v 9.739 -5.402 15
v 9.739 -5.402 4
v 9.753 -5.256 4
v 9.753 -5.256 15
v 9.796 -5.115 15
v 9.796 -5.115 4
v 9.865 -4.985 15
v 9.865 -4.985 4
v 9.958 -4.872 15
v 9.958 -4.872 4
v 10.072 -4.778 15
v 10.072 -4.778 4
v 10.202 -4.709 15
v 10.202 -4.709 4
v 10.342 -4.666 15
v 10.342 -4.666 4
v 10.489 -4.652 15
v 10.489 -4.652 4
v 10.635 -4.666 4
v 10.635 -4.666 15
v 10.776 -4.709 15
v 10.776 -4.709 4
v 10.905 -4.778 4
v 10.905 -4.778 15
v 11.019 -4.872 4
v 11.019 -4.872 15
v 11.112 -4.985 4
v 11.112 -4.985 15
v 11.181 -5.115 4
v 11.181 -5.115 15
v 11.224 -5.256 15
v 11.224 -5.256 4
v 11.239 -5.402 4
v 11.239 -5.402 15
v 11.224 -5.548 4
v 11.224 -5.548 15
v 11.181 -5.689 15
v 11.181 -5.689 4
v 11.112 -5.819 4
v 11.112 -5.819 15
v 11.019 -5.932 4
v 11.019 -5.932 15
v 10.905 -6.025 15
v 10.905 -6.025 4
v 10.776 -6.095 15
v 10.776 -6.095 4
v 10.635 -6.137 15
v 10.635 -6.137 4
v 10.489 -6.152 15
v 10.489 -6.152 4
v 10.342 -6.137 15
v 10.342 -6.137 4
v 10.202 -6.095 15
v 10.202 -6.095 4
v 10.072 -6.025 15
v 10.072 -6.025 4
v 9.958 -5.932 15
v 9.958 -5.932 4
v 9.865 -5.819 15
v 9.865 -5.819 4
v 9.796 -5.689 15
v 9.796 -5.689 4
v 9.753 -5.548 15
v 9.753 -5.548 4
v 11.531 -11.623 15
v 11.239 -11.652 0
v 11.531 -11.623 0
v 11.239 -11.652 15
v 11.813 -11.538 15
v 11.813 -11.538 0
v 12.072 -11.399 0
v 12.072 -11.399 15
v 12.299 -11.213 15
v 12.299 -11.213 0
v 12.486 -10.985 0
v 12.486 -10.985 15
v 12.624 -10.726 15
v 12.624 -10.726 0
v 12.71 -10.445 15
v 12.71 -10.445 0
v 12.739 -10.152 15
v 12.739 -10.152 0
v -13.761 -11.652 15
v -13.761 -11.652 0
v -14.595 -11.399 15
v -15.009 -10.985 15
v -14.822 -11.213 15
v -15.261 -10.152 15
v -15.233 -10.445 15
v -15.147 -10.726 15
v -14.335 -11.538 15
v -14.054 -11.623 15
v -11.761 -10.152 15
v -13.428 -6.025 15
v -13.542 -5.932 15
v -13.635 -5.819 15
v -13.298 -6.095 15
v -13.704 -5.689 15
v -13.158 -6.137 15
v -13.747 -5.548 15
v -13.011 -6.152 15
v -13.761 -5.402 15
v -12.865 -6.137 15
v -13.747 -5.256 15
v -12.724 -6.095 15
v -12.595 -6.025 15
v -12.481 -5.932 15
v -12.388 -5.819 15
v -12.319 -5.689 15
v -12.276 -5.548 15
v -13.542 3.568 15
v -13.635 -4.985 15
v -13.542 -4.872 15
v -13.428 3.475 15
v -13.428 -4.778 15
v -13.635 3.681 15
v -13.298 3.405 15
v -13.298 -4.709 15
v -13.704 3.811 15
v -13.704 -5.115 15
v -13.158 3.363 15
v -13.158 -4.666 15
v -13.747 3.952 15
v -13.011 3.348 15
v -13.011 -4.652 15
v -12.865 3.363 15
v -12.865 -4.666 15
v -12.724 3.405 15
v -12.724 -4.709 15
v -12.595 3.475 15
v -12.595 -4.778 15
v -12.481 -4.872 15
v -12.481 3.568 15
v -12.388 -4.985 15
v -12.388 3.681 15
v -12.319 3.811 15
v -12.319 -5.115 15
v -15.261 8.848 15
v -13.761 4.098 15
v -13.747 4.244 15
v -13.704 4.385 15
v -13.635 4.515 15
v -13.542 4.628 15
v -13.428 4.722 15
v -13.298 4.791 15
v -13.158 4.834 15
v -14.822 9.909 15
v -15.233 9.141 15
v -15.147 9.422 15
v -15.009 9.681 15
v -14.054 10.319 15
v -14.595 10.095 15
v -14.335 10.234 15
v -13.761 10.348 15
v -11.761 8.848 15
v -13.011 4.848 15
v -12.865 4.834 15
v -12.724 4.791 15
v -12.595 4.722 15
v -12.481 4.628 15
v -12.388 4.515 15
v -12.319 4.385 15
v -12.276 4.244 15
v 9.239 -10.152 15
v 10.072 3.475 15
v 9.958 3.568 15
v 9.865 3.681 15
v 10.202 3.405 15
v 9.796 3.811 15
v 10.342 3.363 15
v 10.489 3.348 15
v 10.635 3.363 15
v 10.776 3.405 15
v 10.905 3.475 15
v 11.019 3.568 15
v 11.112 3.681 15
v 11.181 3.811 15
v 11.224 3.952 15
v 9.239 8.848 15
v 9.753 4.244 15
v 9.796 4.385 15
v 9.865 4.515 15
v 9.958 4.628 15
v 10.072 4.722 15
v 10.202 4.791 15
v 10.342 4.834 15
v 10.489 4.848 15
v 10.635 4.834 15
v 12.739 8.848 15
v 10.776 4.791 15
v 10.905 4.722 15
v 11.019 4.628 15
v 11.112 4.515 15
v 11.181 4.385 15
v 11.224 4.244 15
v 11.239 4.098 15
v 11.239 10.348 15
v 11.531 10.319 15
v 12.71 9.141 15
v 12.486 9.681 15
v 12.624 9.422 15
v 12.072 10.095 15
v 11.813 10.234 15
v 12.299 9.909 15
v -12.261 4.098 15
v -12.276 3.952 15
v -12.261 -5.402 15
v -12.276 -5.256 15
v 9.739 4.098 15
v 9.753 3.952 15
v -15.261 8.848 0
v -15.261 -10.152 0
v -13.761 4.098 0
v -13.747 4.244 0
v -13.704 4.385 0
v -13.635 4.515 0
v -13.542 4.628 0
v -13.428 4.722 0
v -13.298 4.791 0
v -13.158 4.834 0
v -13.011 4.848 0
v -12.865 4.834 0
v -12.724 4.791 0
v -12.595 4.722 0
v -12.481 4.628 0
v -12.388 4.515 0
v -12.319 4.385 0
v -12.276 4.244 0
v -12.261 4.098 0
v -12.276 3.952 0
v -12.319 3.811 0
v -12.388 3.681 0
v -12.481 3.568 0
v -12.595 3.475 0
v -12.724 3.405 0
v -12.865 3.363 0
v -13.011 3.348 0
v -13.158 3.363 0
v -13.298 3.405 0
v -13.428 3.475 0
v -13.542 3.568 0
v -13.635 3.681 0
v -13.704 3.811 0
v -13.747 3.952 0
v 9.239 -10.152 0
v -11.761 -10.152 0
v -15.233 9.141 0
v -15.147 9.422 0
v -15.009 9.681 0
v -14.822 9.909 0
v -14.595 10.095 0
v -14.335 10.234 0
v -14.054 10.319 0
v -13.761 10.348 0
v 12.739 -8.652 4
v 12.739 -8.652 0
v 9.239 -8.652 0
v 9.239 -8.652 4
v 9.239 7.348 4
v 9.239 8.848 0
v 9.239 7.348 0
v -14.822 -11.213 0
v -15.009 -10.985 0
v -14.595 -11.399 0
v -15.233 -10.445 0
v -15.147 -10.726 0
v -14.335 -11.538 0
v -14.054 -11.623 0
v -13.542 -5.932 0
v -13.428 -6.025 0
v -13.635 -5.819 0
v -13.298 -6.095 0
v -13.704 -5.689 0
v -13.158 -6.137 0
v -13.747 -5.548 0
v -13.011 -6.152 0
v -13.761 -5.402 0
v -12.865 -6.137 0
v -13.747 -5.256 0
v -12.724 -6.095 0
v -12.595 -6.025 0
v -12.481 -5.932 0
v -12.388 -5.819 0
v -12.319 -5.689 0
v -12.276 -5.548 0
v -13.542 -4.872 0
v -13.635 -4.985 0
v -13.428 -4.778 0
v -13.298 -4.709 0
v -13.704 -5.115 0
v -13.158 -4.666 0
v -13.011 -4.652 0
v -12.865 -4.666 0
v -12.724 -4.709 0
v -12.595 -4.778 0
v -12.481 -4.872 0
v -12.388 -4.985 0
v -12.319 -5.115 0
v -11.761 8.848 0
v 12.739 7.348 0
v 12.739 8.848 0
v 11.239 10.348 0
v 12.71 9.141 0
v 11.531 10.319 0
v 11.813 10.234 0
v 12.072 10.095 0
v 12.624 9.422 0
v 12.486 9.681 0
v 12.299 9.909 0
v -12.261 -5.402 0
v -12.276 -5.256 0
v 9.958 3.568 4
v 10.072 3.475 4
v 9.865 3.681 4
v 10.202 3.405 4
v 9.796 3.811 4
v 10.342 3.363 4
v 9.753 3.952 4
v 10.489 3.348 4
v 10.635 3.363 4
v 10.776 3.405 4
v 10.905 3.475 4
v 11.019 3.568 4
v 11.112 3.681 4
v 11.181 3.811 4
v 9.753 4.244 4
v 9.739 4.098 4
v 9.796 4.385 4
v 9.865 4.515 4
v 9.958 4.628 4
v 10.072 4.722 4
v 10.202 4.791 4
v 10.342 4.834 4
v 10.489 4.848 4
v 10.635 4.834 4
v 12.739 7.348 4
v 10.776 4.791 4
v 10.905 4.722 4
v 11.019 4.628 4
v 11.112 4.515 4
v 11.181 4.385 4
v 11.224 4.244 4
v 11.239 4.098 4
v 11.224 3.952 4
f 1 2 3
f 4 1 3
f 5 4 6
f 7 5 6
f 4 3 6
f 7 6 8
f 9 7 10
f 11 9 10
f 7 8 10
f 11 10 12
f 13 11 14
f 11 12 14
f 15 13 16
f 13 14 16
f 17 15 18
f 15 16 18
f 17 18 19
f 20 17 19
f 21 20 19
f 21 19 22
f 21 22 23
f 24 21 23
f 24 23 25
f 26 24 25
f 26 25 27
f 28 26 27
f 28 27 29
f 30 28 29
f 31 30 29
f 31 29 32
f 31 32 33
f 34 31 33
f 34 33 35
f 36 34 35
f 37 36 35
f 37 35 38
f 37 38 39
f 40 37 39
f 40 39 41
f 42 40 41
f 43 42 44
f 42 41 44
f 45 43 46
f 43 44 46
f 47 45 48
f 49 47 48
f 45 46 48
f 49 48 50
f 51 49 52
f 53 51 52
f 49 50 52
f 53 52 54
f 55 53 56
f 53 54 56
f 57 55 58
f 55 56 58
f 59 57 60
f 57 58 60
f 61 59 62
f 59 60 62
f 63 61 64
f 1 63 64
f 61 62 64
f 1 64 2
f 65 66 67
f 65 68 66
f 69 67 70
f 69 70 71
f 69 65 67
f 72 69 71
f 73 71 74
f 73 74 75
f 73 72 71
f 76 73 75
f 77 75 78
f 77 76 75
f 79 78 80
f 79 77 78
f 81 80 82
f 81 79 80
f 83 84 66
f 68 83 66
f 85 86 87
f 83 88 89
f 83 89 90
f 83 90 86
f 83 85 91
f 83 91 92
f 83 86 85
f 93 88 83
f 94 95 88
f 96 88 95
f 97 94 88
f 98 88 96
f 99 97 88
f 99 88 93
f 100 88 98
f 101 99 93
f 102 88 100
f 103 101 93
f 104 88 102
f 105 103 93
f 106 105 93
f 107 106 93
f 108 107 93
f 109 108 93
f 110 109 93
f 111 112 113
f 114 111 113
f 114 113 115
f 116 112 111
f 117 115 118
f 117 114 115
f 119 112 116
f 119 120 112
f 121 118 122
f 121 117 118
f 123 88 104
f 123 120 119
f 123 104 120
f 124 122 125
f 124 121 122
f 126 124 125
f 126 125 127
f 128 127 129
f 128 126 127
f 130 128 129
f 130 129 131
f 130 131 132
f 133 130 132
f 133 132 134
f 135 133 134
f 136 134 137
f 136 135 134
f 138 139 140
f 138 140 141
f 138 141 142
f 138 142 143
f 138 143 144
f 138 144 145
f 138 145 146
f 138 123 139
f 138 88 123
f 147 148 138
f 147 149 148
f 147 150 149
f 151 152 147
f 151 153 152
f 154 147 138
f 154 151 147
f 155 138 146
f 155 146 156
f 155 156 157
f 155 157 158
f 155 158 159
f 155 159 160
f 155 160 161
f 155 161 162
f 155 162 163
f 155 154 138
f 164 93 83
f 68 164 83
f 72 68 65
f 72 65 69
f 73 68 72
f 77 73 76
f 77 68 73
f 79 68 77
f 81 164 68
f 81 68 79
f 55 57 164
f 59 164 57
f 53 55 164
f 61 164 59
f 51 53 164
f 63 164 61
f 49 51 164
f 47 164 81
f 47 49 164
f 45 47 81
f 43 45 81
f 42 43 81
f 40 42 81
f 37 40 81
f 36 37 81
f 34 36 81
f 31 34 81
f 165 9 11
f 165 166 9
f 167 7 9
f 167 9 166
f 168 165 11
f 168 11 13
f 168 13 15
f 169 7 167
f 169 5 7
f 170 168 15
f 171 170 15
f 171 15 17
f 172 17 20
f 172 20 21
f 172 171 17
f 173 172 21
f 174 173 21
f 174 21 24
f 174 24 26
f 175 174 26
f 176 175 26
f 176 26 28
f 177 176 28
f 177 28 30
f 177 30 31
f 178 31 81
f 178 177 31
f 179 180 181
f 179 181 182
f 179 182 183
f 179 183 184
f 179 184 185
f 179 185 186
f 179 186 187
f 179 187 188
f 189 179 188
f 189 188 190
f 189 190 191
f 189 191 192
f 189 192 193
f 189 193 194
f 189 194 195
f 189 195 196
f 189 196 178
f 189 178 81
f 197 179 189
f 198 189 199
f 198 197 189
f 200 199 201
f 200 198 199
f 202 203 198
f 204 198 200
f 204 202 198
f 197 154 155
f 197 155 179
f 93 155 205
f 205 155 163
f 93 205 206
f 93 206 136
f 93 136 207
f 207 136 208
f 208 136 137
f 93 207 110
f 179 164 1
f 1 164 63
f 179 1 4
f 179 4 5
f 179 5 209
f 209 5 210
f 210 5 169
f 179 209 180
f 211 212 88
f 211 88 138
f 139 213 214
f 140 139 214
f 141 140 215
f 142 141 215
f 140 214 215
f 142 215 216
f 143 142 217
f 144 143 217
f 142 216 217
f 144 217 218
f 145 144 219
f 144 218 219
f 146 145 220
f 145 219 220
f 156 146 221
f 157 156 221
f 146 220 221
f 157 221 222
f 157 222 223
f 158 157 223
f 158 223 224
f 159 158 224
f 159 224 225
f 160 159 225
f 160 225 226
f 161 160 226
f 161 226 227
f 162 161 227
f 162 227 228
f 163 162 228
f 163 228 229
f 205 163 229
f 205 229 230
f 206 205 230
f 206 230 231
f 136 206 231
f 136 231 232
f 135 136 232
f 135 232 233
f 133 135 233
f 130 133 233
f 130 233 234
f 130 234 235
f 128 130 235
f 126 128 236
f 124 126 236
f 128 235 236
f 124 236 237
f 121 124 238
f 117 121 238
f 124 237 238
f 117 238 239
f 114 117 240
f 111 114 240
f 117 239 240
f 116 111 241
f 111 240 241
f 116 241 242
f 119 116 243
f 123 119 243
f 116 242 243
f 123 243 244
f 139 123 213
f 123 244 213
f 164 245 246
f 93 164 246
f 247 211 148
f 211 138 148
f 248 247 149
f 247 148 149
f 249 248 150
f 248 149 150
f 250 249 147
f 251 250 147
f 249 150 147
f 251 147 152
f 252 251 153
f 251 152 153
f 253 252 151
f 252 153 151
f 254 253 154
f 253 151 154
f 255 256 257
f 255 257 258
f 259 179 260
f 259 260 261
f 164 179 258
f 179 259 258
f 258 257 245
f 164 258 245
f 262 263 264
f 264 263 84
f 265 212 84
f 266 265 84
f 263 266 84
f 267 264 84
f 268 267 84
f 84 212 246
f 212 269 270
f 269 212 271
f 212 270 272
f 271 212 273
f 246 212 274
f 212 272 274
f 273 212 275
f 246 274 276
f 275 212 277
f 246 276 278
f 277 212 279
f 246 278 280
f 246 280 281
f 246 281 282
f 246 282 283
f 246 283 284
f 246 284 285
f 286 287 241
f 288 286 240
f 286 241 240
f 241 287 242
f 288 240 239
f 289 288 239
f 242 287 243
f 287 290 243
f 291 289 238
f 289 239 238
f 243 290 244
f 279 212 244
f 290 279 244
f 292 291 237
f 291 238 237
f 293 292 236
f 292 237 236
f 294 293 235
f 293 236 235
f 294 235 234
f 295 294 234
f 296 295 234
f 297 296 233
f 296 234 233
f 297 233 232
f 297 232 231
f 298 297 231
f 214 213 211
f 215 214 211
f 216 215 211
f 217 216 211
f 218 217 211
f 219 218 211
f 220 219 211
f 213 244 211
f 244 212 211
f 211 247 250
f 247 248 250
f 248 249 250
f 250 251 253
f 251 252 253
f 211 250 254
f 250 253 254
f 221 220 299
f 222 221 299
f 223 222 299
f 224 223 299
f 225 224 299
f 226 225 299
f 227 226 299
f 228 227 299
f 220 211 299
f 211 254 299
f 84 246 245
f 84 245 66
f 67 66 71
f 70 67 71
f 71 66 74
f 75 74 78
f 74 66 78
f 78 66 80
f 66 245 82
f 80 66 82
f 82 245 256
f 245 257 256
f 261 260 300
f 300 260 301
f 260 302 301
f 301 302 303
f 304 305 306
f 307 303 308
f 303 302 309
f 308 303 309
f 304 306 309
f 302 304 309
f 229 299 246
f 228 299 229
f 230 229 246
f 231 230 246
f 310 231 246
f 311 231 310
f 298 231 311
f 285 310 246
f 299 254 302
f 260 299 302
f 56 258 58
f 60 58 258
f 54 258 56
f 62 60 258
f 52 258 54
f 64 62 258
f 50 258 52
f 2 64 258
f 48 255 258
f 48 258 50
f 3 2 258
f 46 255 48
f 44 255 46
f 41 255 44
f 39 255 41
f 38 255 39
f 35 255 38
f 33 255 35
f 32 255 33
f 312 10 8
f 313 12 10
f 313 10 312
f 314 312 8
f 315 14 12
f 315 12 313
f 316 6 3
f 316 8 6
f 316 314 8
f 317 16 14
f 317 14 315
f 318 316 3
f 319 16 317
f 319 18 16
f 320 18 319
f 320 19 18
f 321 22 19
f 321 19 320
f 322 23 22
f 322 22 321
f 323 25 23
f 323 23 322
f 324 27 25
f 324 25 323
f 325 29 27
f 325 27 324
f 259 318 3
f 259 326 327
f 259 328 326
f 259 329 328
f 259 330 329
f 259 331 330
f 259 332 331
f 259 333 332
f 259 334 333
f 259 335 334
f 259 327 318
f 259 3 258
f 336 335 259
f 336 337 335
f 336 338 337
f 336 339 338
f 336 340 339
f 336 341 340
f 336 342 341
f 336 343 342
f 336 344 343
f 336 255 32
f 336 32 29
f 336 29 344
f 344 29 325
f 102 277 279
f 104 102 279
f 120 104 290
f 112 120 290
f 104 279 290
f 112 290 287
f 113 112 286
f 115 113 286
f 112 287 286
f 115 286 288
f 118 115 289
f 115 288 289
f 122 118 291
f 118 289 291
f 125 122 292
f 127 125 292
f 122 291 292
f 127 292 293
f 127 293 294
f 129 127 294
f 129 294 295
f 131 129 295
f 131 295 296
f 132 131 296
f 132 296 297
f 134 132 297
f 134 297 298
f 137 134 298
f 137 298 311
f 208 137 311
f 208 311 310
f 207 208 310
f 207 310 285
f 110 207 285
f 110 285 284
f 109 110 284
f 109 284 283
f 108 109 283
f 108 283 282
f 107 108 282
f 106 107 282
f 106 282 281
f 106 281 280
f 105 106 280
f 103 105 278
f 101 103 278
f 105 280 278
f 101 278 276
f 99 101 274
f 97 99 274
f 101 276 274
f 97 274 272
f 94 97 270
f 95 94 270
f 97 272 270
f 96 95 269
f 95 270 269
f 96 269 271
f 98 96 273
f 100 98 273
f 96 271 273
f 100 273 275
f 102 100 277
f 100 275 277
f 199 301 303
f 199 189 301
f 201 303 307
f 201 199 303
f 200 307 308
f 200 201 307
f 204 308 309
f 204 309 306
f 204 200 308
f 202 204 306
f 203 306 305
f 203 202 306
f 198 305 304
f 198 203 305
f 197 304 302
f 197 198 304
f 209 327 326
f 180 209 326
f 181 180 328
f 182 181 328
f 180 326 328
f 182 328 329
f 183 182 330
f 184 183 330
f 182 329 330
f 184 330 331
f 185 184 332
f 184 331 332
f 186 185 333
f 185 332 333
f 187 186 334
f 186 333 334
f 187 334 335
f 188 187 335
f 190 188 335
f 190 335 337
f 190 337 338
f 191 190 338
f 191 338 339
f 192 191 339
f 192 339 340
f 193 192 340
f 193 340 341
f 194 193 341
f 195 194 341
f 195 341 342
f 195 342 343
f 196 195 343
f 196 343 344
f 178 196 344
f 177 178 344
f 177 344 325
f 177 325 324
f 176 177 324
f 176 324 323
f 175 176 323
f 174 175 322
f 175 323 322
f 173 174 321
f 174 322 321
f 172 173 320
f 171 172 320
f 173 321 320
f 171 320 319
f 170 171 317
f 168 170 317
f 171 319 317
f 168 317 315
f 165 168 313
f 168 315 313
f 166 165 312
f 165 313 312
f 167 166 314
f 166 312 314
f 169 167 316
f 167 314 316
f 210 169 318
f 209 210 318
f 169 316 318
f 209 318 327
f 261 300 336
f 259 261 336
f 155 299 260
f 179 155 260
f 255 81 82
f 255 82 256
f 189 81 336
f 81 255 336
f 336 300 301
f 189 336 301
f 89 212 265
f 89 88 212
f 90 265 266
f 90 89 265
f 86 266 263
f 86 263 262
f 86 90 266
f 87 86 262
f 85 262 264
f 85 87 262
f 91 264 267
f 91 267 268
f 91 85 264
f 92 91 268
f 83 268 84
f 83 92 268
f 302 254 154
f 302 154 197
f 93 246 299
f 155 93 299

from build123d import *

# Parameters (mm, degrees)
F0_W     = 28
F0_H     = 22
F1_DEPTH = 15
F3_R     = 1.5
F5_D     = 1.5
F6_D     = 1.5
F7_D     = 1.5
F8_D     = 1.5
F2_W     = 16
F2_H     = 4
F9_DEPTH = 10


with BuildPart() as f1:
    # F0 (on Top) → F1 (new body)
    with BuildSketch(Plane.XY):
        with Locations((-1.261453, -0.651873)):
            Rectangle(F0_W, F0_H)
        Polygon((-11.761453, -10.151873), (-11.761453, 8.848127), (5.738547, 8.848127), (9.238547, 8.848127), (9.238547, -10.151873), (5.738547, -10.151873), align=None, mode=Mode.SUBTRACT)
    extrude(amount=F1_DEPTH)

    # F3
    f3_edges = [f1.edges().sort_by_distance(p)[0] for p in [
        (12.738547, 10.348127, 7.5),
        (12.738547, -11.651873, 7.5),
        (-15.261453, -11.651873, 7.5),
        (-15.261453, 10.348127, 7.5),
    ]]
    fillet(f3_edges, radius=F3_R)

    # F5 (through all)
    with Locations(Plane.XY.offset(15)):
        with Locations((-13.011453, 4.098127)):
            Hole(F5_D / 2)

    # F6 (through all)
    with Locations(Plane.XY.offset(15)):
        with Locations((-13.011453, -5.401873)):
            Hole(F6_D / 2)

    # F7 (through all)
    with Locations(Plane.XY.offset(15)):
        with Locations((10.488547, -5.401873)):
            Hole(F7_D / 2)

    # F8 (through all)
    with Locations(Plane.XY.offset(15)):
        with Locations((10.488547, 4.098127)):
            Hole(F8_D / 2)

    # F2 (on face) → F9 (cut)
    with BuildSketch(Plane.YZ.offset(12.738547)):
        with Locations((-0.651873, 2)):
            Rectangle(F2_W, F2_H)
    extrude(amount=-F9_DEPTH, mode=Mode.SUBTRACT)


solid = f1.part
